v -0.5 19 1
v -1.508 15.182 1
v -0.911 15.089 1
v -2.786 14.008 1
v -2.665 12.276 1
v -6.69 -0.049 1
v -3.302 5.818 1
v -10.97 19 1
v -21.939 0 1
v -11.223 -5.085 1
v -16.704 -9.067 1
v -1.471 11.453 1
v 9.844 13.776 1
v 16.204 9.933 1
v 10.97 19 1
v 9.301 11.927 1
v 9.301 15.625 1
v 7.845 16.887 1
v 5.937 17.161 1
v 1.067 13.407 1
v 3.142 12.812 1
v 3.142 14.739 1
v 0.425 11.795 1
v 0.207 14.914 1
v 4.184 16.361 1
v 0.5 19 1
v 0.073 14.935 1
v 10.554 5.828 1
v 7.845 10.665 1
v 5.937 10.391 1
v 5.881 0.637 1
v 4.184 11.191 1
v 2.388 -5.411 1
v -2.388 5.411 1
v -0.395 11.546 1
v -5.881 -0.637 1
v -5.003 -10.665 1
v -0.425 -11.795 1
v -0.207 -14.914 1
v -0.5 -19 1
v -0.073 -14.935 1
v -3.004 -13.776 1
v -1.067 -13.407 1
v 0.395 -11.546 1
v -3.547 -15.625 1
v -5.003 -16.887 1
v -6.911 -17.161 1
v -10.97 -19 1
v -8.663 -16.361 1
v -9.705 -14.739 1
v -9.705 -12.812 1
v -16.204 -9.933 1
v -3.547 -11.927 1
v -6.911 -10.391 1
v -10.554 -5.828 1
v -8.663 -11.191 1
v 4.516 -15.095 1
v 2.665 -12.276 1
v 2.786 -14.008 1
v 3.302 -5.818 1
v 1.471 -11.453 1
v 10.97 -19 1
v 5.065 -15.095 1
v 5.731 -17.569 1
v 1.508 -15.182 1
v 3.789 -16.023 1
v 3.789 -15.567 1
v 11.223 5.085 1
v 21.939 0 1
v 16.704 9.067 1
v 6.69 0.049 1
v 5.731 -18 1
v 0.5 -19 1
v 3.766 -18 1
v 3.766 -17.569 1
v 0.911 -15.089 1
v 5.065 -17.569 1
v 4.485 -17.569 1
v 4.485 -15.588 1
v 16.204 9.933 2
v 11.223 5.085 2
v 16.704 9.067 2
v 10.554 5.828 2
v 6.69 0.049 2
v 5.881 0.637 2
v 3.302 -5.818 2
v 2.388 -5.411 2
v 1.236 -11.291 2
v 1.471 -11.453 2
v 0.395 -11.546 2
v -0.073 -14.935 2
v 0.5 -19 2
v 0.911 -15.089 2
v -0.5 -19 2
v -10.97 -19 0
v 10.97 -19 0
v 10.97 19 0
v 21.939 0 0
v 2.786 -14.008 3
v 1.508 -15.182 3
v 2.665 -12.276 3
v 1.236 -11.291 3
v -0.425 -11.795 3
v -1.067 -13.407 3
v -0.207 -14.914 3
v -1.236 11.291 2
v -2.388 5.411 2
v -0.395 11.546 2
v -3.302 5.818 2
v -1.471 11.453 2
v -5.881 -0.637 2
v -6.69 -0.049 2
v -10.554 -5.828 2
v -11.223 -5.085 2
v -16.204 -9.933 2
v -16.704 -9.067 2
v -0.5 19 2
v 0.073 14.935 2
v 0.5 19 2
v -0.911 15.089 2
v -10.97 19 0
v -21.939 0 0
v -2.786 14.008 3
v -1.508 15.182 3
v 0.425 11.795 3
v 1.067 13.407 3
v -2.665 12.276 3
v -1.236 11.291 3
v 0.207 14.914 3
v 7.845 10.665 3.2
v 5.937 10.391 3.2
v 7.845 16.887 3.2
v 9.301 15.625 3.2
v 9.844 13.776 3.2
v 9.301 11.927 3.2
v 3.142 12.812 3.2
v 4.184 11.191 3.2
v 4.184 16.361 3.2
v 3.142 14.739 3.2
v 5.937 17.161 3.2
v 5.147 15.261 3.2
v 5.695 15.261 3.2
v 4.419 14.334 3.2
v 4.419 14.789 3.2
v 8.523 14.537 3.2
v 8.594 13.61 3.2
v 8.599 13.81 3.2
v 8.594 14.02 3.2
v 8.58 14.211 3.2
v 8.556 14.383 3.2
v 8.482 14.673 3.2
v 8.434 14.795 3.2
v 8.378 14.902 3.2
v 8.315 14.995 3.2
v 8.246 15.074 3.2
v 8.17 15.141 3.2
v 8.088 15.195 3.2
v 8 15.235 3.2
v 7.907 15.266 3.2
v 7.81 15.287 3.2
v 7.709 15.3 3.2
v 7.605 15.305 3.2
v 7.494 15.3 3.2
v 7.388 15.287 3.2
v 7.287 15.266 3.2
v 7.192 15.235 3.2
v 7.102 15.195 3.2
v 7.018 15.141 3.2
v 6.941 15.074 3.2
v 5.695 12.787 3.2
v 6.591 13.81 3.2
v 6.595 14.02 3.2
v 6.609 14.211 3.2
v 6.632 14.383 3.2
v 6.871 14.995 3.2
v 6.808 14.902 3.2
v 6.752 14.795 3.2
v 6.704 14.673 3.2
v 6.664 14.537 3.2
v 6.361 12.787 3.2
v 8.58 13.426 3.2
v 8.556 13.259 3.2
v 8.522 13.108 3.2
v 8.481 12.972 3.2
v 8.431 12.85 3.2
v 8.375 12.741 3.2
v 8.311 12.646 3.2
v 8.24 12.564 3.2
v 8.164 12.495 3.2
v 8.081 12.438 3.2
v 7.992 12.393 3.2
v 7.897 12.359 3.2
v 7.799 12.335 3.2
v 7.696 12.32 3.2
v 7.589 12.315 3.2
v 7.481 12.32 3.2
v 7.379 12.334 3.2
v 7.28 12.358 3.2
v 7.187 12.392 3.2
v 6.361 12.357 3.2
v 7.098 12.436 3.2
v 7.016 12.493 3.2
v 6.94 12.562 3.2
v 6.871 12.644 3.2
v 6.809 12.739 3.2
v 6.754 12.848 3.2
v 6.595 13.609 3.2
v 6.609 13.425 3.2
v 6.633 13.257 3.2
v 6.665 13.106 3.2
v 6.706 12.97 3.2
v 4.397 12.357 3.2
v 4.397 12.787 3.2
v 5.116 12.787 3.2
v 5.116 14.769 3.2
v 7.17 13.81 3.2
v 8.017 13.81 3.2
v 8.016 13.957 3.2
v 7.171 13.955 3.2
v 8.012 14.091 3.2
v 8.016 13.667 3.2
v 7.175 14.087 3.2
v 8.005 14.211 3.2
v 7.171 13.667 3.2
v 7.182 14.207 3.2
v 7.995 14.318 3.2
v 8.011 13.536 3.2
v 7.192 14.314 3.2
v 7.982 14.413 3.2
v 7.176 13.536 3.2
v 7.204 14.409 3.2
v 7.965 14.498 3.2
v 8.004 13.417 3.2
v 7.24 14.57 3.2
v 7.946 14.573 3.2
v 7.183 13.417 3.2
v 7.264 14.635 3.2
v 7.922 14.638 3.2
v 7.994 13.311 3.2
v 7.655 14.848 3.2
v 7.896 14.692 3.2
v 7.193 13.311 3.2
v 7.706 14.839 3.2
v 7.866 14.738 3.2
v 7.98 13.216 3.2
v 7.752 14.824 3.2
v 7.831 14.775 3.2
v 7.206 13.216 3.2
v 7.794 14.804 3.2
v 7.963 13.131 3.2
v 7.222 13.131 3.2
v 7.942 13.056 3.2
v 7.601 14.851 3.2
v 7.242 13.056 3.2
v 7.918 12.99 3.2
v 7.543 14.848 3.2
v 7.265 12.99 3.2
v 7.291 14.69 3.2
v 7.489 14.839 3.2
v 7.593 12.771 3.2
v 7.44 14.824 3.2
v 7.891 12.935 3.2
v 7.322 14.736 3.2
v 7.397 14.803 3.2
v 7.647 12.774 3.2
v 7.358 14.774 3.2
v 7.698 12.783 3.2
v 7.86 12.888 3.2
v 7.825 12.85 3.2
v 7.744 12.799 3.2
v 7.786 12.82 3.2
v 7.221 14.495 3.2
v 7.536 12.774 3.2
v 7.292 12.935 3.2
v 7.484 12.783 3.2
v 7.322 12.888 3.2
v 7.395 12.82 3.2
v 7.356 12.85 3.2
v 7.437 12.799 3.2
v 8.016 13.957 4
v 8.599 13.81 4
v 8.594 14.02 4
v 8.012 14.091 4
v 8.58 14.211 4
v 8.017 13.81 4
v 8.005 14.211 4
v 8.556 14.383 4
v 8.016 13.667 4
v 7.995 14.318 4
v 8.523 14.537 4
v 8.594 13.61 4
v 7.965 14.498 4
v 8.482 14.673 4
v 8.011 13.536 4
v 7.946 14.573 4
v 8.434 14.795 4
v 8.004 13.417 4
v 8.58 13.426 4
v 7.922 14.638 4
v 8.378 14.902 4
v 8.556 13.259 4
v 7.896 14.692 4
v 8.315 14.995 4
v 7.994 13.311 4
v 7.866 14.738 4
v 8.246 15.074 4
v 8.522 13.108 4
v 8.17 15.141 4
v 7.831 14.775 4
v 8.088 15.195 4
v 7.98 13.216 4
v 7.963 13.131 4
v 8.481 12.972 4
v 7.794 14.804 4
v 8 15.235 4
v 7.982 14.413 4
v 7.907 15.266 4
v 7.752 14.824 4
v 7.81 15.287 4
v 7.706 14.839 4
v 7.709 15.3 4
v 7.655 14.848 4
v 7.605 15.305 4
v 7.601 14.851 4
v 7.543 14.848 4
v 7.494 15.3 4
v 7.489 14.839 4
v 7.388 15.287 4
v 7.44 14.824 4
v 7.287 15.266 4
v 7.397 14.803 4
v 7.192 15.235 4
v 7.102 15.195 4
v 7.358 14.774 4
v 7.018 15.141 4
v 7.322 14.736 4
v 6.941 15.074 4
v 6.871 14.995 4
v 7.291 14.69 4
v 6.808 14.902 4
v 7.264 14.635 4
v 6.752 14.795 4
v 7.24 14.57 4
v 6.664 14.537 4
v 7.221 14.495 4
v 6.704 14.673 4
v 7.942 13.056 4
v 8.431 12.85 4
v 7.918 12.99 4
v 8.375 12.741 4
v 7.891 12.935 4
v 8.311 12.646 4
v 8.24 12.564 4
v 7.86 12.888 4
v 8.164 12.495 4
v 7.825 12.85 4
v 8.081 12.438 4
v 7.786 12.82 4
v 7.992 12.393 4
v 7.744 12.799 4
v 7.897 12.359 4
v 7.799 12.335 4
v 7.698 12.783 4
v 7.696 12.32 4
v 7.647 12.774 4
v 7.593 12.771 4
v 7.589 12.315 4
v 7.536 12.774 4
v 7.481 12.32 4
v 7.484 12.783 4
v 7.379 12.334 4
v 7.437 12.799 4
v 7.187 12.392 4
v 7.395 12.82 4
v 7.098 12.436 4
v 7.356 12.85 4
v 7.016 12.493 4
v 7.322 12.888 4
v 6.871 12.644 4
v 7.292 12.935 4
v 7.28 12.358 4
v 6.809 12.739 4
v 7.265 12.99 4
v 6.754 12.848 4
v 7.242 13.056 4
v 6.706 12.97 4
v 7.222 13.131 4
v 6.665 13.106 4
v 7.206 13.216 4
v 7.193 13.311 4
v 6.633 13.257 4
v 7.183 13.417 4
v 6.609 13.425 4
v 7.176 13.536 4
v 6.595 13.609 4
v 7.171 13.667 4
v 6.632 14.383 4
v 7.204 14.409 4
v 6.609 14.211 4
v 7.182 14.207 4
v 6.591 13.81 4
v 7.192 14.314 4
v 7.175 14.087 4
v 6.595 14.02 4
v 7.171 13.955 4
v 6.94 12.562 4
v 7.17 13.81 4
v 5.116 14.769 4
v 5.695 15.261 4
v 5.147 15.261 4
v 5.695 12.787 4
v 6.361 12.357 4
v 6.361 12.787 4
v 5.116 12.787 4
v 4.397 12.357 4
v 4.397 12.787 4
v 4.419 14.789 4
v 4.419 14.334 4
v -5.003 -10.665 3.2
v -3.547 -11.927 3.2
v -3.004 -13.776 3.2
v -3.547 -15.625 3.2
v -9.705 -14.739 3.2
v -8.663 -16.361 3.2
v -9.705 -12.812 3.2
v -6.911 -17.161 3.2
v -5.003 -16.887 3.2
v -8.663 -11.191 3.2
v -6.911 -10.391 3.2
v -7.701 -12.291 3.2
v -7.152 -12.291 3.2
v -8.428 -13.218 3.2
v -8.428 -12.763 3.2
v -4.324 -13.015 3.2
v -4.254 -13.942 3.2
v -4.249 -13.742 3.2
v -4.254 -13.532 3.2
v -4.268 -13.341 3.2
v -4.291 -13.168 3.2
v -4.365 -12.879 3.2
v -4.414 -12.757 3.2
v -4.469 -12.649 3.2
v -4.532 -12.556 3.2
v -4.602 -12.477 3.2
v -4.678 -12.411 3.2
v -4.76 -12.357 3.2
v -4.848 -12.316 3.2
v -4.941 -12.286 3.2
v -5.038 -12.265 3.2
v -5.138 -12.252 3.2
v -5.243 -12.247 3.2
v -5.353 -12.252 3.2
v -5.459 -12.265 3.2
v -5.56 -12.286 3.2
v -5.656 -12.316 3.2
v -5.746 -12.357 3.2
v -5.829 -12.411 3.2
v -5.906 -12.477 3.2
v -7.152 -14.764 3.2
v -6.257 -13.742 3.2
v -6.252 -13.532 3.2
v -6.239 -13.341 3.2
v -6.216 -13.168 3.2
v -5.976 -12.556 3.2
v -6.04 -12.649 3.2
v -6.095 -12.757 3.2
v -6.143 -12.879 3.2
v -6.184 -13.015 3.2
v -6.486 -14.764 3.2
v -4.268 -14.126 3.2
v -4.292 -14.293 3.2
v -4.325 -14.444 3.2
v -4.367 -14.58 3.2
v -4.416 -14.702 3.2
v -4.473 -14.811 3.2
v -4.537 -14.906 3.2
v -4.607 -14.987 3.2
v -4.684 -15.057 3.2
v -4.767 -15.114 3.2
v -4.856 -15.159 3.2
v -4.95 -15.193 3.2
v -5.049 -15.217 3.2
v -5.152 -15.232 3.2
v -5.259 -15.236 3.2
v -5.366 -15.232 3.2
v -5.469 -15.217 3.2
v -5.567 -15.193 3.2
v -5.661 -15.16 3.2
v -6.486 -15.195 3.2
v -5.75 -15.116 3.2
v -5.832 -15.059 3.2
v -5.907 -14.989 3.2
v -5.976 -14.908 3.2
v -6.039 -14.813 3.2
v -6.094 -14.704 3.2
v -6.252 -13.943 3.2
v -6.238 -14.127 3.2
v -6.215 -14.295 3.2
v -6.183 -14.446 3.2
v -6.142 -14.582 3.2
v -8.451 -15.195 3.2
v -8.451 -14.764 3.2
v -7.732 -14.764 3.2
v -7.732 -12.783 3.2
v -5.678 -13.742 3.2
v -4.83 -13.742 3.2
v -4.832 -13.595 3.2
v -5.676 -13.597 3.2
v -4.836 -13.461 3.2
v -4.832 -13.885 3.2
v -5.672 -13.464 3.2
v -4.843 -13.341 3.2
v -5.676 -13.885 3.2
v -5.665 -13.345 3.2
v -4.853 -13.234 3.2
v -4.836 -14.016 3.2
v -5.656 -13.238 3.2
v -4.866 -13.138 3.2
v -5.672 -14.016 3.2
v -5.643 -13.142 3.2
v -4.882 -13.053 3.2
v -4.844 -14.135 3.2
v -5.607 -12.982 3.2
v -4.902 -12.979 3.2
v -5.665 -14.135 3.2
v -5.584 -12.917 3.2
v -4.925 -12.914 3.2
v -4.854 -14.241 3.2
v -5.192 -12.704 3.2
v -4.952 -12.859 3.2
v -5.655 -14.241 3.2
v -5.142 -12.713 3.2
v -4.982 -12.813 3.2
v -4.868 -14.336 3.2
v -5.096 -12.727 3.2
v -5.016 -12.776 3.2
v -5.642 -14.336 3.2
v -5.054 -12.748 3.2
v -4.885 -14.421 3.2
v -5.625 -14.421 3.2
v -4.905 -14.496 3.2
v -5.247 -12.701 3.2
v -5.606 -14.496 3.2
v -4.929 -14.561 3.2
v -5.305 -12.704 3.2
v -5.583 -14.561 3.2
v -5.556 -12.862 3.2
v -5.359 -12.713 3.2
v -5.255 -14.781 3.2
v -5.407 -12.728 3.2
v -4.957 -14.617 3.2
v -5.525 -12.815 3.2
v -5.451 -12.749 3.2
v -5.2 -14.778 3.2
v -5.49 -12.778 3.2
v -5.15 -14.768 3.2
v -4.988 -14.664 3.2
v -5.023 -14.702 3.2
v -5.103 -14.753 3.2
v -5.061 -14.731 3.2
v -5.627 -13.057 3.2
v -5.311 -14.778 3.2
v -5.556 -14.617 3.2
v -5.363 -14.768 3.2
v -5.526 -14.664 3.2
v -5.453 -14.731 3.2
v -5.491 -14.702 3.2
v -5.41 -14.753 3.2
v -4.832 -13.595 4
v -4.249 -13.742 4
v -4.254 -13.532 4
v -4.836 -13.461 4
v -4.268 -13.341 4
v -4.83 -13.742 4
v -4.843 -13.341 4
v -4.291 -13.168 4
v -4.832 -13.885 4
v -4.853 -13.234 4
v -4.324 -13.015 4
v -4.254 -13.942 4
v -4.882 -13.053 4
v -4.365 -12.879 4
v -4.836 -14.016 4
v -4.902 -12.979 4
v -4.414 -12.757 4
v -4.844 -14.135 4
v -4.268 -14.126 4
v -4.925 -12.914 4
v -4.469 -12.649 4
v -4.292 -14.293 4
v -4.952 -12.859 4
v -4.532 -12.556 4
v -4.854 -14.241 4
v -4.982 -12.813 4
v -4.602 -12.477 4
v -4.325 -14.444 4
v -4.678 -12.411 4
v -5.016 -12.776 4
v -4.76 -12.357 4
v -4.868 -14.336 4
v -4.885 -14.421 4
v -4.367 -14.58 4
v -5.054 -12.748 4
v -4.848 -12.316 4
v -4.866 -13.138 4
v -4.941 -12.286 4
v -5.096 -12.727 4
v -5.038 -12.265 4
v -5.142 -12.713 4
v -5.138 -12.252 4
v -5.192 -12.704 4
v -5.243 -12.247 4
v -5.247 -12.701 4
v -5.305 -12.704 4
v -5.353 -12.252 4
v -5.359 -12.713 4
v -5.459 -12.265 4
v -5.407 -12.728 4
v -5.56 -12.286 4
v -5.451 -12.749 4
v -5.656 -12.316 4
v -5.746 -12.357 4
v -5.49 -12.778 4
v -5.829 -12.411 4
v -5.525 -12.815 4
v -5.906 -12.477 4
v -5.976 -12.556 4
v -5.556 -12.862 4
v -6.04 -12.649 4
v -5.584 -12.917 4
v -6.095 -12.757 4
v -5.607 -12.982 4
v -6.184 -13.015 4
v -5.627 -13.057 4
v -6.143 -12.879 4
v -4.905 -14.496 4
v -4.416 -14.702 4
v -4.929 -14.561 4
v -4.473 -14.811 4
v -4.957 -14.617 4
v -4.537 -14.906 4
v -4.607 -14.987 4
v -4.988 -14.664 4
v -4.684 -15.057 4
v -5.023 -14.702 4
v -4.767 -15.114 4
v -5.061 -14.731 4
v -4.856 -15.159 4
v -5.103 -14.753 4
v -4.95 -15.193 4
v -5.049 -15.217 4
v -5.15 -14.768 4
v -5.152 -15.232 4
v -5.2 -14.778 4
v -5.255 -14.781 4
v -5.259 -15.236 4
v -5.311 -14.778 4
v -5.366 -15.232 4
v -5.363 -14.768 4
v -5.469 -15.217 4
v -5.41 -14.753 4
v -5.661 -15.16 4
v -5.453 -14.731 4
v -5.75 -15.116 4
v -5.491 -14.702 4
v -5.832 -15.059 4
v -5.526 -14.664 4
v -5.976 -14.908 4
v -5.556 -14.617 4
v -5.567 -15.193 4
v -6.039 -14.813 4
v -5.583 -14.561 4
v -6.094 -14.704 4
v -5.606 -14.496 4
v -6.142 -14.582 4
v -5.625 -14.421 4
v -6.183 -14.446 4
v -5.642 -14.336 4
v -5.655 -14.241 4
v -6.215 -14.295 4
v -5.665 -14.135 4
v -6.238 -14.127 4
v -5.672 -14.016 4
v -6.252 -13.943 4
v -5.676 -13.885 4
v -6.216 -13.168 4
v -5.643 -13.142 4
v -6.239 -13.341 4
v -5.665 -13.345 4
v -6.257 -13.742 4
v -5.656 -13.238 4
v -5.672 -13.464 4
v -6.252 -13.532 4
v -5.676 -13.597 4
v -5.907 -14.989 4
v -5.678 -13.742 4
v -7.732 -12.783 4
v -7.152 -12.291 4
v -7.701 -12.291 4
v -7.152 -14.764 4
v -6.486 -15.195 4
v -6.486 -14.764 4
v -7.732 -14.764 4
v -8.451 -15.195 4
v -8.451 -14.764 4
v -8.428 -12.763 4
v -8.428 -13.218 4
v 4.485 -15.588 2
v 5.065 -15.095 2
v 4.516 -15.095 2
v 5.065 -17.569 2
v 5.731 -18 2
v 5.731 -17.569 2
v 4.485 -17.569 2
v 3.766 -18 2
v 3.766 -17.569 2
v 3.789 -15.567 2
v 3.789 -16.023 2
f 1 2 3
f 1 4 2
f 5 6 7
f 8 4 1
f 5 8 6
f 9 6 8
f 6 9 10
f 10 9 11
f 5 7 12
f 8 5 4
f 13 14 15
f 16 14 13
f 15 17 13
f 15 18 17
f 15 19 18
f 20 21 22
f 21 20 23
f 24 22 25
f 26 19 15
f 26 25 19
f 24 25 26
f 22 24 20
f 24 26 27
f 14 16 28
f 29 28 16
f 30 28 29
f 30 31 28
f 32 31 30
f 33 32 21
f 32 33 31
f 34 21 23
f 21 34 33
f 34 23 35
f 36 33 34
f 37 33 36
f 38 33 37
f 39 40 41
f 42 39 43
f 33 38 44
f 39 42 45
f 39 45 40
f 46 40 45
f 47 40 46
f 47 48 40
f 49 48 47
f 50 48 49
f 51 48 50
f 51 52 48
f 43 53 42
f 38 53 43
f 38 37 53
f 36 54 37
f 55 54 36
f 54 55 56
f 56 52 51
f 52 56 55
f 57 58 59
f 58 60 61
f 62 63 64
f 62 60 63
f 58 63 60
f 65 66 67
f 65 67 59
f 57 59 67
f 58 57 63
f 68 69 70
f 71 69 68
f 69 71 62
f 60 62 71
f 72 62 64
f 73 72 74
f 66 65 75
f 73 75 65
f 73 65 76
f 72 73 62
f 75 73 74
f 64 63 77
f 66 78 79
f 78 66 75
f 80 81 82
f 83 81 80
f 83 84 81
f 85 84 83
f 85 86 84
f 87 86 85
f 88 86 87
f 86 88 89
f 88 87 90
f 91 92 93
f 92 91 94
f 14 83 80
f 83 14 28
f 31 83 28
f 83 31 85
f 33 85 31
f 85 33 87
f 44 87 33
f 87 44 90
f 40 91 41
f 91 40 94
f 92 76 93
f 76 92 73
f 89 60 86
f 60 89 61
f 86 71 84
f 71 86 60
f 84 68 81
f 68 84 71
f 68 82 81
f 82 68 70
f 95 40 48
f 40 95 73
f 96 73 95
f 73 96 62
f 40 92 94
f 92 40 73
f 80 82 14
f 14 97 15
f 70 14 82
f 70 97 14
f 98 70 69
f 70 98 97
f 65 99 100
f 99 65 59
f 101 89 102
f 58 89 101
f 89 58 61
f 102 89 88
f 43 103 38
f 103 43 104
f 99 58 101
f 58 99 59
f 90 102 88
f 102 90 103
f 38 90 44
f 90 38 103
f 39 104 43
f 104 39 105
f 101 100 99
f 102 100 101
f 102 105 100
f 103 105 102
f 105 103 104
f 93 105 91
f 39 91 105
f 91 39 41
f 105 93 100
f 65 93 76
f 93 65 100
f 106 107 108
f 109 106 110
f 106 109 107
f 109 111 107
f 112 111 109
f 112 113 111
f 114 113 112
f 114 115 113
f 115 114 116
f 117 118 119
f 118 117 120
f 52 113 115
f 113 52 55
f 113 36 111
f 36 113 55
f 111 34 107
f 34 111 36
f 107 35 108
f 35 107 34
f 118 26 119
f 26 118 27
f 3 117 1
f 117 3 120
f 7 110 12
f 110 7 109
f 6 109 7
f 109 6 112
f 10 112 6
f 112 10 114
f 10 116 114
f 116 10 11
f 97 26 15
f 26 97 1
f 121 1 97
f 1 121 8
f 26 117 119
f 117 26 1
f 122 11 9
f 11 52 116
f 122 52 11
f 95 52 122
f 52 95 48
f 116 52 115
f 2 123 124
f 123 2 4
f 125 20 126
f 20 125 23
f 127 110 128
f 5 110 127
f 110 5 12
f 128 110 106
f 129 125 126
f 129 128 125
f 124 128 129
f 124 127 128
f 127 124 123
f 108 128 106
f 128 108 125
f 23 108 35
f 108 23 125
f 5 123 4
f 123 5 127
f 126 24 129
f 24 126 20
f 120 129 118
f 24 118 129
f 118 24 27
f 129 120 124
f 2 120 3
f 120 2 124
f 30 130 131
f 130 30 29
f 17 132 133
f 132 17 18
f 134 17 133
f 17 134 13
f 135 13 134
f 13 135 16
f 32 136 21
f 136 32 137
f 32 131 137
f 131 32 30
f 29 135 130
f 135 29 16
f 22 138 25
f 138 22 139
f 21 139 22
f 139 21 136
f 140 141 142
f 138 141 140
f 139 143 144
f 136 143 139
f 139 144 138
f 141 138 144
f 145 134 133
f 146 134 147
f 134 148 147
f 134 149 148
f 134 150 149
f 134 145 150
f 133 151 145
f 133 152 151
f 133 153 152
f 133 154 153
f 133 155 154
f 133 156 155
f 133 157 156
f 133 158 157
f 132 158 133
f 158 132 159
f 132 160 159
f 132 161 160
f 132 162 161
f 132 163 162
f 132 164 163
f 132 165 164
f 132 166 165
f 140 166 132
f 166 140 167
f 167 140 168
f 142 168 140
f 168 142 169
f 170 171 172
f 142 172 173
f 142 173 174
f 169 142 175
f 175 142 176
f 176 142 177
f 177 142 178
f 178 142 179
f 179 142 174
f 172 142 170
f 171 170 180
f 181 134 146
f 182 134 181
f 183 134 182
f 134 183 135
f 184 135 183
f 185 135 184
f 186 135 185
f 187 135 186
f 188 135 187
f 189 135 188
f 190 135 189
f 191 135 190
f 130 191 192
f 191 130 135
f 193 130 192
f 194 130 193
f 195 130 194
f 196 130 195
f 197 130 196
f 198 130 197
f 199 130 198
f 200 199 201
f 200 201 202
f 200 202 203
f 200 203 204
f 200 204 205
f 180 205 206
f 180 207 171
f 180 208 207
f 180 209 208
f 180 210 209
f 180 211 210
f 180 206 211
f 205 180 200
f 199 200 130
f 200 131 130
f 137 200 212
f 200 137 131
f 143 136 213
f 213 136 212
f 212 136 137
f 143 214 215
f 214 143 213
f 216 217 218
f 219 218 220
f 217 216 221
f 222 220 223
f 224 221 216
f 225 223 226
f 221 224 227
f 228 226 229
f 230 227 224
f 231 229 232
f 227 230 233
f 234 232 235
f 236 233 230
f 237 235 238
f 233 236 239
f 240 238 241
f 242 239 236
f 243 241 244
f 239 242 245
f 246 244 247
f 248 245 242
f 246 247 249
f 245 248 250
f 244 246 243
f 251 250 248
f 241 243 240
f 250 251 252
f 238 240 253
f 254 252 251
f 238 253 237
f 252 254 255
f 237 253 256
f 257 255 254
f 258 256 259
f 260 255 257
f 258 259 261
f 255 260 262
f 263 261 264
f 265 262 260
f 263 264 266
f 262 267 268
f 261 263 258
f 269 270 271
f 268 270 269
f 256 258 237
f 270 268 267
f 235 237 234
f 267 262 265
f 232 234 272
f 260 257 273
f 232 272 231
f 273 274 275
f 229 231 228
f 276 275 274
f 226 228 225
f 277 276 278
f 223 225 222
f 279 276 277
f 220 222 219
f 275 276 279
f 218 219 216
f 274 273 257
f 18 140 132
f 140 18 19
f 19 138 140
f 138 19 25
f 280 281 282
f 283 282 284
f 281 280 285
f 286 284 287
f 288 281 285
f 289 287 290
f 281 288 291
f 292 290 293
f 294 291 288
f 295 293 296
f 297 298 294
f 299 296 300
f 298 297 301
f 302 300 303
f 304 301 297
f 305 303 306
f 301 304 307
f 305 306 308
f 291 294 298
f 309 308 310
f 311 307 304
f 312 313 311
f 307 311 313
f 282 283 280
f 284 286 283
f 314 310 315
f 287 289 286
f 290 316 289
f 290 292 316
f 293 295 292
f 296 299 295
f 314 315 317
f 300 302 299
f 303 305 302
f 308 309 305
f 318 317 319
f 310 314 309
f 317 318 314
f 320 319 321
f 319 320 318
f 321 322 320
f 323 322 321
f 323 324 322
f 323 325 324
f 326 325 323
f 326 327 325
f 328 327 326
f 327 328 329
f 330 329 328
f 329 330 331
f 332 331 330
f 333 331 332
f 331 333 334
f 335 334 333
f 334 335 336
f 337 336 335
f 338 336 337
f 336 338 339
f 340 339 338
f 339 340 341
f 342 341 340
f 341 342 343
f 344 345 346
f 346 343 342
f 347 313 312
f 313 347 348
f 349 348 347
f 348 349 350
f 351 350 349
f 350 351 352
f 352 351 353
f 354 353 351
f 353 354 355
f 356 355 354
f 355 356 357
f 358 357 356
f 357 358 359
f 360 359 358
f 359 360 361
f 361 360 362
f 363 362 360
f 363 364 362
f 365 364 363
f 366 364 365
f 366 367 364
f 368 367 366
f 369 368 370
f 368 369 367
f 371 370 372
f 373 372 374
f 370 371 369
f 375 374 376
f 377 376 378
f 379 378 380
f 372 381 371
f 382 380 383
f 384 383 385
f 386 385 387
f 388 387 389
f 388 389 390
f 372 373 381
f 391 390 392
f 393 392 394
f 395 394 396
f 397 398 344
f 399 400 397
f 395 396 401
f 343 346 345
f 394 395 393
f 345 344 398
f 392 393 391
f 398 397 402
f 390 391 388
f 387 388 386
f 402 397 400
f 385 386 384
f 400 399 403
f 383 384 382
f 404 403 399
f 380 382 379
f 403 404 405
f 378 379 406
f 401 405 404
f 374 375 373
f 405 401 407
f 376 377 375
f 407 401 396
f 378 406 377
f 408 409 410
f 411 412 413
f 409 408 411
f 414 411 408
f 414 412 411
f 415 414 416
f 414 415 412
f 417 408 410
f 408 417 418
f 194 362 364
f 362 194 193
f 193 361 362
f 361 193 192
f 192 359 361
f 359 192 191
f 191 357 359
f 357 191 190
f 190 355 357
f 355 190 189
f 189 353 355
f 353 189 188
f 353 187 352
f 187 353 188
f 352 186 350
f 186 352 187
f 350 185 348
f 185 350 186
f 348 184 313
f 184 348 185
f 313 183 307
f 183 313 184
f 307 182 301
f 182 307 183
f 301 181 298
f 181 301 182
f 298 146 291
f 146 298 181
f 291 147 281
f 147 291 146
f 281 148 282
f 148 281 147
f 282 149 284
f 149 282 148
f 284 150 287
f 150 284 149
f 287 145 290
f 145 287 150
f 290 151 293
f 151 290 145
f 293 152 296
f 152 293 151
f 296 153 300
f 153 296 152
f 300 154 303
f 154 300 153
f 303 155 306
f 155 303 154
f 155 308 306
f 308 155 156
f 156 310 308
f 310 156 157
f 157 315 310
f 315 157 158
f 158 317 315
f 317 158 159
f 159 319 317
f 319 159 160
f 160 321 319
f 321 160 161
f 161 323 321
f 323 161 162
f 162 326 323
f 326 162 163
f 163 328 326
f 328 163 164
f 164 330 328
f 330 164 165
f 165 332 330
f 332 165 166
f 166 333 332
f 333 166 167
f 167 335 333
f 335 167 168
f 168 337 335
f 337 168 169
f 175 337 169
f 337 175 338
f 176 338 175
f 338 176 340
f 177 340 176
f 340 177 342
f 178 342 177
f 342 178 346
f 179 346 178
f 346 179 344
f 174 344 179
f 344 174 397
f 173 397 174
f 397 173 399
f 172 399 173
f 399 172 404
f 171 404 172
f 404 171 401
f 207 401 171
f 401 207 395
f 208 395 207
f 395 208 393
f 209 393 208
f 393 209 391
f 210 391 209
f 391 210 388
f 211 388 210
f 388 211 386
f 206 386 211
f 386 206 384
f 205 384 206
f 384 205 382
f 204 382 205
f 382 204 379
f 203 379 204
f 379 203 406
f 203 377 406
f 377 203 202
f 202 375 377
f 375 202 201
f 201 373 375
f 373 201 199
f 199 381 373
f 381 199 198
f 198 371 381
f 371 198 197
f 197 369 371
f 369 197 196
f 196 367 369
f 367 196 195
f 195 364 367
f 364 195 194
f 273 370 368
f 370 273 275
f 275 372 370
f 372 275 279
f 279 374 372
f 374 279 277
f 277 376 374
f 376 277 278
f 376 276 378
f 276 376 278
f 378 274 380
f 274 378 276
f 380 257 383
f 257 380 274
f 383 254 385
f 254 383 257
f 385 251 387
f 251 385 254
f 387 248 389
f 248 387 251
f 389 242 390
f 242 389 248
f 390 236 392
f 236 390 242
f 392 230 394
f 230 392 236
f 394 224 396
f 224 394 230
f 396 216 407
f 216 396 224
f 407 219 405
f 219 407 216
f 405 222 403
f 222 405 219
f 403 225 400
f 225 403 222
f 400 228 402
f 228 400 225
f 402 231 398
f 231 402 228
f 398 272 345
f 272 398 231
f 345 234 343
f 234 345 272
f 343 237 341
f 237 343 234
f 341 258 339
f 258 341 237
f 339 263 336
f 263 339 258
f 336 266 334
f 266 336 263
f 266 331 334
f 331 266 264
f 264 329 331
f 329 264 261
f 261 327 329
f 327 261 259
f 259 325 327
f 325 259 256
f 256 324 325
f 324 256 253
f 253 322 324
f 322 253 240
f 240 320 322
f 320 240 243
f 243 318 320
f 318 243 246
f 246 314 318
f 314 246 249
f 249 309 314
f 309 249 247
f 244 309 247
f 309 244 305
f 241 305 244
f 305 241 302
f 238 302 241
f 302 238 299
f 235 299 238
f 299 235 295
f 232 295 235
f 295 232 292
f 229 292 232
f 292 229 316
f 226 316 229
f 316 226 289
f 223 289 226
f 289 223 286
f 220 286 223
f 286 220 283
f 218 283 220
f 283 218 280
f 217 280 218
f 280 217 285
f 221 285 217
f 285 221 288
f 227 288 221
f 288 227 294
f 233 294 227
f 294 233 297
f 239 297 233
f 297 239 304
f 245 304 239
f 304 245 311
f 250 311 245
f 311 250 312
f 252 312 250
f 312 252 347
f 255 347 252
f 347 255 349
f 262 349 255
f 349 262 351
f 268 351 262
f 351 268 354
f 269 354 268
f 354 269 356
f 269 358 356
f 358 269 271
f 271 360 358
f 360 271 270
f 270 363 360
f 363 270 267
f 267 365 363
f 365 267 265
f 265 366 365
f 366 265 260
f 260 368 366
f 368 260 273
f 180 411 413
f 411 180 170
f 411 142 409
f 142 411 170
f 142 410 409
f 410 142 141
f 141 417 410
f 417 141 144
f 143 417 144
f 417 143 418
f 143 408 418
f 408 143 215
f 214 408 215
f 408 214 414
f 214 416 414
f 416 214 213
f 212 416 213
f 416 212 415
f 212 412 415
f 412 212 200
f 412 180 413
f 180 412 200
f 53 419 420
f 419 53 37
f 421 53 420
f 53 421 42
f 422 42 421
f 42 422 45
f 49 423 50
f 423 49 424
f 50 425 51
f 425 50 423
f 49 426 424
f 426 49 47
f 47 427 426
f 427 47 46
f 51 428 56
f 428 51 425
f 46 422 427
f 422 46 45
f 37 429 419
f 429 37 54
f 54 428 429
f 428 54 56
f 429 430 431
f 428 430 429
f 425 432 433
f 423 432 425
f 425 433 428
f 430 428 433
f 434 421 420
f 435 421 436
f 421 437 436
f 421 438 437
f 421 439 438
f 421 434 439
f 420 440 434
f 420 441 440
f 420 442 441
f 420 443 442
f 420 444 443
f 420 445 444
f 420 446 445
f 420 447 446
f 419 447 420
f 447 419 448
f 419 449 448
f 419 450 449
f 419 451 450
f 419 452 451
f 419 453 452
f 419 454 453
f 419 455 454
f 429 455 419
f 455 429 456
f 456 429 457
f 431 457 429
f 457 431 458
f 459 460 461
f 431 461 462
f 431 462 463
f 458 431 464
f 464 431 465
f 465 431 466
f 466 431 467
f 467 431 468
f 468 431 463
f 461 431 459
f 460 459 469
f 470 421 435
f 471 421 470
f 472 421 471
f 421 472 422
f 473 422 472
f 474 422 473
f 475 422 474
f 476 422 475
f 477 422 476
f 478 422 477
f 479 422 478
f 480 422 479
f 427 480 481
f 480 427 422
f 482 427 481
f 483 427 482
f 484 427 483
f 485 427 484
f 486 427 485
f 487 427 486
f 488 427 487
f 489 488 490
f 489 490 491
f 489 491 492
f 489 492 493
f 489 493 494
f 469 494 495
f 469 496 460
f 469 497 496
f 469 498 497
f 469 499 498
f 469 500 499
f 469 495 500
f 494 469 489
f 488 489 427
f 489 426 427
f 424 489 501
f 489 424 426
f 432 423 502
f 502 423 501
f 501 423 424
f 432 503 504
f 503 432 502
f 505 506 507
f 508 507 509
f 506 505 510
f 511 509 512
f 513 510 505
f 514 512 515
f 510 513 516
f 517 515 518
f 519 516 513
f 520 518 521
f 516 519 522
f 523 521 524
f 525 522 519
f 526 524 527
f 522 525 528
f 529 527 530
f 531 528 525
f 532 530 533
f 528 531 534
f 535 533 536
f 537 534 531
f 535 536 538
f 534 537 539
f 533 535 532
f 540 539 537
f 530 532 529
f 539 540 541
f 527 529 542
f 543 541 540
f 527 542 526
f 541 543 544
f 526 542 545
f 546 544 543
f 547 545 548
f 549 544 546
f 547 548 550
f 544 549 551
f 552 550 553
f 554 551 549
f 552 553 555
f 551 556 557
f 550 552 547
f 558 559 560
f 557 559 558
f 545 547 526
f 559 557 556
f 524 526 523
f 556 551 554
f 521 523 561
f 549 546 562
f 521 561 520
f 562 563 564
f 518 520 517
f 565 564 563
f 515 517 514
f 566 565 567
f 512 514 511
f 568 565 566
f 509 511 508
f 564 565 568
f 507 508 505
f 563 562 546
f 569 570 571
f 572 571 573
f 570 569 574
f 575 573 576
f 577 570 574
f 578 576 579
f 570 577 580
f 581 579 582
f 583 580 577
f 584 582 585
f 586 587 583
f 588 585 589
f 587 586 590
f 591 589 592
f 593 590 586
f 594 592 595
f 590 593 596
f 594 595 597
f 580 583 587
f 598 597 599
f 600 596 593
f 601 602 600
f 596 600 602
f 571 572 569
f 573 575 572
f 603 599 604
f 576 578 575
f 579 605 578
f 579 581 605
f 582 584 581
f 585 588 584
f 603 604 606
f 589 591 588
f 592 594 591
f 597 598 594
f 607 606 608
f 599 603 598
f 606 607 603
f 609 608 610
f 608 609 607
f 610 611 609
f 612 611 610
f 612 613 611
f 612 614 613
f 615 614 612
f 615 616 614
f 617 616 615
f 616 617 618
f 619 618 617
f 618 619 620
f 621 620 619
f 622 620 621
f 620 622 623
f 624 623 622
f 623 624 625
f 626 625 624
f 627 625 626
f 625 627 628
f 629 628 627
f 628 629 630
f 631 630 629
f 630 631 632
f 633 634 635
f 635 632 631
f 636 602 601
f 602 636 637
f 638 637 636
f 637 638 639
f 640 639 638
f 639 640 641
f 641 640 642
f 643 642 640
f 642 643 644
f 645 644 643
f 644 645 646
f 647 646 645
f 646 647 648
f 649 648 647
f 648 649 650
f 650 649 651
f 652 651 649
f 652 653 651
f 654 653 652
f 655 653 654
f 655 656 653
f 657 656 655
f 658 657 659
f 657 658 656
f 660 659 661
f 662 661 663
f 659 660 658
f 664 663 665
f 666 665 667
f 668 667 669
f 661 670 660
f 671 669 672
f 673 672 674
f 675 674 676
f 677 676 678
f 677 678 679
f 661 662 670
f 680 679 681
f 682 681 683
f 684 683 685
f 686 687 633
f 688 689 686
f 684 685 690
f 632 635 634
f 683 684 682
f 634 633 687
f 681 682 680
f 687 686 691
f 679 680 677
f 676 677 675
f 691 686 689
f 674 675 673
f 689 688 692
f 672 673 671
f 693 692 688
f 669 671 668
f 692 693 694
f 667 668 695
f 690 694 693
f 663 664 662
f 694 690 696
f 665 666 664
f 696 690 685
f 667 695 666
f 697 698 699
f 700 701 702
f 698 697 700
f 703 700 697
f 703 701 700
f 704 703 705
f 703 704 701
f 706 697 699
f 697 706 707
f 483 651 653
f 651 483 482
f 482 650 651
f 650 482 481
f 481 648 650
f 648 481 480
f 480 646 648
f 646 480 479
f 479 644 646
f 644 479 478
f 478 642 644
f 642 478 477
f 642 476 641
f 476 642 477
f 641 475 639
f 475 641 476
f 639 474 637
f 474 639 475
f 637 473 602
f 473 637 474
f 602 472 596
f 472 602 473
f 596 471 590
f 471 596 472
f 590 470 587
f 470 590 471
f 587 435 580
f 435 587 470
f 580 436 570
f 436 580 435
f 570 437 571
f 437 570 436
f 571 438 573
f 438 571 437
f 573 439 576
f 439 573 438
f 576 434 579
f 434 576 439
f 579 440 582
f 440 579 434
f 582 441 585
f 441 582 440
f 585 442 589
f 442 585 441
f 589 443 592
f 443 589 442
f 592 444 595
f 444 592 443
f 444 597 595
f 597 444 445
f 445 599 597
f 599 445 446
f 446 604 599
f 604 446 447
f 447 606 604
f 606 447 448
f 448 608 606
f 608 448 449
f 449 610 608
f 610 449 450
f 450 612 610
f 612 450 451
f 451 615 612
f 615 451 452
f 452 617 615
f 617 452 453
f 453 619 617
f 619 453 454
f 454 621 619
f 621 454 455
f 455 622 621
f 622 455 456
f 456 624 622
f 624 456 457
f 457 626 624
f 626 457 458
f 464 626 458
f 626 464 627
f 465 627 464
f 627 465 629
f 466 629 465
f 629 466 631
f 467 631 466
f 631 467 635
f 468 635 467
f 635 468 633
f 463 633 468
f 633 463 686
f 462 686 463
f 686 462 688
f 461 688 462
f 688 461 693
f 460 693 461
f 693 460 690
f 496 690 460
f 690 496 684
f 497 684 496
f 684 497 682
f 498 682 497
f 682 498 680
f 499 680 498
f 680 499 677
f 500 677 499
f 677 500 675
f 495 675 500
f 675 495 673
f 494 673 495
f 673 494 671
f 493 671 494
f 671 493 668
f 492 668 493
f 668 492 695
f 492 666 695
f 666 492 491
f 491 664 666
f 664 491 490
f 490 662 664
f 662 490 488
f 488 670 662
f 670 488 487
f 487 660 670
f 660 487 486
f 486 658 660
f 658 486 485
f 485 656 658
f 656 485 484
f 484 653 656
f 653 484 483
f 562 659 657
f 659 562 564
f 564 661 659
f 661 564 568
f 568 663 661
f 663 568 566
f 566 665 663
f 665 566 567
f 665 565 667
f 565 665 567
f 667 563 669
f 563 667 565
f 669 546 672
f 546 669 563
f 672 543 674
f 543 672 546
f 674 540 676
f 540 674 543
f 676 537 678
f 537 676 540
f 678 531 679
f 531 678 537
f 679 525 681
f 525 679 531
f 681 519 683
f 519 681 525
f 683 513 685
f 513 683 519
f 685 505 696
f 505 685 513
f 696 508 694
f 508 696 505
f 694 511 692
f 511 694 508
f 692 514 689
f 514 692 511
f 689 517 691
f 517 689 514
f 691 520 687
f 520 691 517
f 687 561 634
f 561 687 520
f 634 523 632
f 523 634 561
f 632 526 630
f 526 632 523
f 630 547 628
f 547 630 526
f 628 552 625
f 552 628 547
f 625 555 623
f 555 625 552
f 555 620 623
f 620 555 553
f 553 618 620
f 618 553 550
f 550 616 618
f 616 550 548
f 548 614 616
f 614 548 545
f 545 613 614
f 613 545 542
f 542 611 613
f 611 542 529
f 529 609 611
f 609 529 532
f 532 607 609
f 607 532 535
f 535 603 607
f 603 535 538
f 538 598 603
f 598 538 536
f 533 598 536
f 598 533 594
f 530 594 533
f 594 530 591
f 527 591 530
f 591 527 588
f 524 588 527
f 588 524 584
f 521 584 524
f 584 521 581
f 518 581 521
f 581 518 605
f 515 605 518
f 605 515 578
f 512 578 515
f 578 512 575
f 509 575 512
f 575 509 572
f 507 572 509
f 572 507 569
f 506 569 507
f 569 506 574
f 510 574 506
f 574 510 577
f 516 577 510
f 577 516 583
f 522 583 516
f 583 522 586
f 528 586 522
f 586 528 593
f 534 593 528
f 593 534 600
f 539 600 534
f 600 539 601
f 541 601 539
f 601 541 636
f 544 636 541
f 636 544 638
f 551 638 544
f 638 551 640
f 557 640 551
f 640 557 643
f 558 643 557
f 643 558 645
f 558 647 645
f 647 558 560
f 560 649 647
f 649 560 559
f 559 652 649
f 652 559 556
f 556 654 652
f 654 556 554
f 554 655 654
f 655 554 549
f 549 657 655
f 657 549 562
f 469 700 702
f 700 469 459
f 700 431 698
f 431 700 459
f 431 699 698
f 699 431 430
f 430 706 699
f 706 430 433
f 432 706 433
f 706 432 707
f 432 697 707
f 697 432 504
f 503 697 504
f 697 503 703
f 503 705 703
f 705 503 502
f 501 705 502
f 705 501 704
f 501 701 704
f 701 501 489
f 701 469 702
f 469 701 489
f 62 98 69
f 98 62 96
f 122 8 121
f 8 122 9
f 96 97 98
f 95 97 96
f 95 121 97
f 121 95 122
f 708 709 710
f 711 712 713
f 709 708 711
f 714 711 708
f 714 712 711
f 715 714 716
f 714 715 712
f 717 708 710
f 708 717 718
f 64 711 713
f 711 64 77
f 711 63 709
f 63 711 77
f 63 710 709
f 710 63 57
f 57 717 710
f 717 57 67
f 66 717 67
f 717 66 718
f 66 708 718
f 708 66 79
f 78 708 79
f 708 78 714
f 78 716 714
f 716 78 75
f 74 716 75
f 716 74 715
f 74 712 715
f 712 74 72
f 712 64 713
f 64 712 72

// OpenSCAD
include <../Scripts/18xx tiles basic functions.scad>

small_town_light_curve2(r=0);
small_town_light_curve2(r=3);
hex();
put_value("10",25);
put_value("10",-155);
put_tilenr("1");
